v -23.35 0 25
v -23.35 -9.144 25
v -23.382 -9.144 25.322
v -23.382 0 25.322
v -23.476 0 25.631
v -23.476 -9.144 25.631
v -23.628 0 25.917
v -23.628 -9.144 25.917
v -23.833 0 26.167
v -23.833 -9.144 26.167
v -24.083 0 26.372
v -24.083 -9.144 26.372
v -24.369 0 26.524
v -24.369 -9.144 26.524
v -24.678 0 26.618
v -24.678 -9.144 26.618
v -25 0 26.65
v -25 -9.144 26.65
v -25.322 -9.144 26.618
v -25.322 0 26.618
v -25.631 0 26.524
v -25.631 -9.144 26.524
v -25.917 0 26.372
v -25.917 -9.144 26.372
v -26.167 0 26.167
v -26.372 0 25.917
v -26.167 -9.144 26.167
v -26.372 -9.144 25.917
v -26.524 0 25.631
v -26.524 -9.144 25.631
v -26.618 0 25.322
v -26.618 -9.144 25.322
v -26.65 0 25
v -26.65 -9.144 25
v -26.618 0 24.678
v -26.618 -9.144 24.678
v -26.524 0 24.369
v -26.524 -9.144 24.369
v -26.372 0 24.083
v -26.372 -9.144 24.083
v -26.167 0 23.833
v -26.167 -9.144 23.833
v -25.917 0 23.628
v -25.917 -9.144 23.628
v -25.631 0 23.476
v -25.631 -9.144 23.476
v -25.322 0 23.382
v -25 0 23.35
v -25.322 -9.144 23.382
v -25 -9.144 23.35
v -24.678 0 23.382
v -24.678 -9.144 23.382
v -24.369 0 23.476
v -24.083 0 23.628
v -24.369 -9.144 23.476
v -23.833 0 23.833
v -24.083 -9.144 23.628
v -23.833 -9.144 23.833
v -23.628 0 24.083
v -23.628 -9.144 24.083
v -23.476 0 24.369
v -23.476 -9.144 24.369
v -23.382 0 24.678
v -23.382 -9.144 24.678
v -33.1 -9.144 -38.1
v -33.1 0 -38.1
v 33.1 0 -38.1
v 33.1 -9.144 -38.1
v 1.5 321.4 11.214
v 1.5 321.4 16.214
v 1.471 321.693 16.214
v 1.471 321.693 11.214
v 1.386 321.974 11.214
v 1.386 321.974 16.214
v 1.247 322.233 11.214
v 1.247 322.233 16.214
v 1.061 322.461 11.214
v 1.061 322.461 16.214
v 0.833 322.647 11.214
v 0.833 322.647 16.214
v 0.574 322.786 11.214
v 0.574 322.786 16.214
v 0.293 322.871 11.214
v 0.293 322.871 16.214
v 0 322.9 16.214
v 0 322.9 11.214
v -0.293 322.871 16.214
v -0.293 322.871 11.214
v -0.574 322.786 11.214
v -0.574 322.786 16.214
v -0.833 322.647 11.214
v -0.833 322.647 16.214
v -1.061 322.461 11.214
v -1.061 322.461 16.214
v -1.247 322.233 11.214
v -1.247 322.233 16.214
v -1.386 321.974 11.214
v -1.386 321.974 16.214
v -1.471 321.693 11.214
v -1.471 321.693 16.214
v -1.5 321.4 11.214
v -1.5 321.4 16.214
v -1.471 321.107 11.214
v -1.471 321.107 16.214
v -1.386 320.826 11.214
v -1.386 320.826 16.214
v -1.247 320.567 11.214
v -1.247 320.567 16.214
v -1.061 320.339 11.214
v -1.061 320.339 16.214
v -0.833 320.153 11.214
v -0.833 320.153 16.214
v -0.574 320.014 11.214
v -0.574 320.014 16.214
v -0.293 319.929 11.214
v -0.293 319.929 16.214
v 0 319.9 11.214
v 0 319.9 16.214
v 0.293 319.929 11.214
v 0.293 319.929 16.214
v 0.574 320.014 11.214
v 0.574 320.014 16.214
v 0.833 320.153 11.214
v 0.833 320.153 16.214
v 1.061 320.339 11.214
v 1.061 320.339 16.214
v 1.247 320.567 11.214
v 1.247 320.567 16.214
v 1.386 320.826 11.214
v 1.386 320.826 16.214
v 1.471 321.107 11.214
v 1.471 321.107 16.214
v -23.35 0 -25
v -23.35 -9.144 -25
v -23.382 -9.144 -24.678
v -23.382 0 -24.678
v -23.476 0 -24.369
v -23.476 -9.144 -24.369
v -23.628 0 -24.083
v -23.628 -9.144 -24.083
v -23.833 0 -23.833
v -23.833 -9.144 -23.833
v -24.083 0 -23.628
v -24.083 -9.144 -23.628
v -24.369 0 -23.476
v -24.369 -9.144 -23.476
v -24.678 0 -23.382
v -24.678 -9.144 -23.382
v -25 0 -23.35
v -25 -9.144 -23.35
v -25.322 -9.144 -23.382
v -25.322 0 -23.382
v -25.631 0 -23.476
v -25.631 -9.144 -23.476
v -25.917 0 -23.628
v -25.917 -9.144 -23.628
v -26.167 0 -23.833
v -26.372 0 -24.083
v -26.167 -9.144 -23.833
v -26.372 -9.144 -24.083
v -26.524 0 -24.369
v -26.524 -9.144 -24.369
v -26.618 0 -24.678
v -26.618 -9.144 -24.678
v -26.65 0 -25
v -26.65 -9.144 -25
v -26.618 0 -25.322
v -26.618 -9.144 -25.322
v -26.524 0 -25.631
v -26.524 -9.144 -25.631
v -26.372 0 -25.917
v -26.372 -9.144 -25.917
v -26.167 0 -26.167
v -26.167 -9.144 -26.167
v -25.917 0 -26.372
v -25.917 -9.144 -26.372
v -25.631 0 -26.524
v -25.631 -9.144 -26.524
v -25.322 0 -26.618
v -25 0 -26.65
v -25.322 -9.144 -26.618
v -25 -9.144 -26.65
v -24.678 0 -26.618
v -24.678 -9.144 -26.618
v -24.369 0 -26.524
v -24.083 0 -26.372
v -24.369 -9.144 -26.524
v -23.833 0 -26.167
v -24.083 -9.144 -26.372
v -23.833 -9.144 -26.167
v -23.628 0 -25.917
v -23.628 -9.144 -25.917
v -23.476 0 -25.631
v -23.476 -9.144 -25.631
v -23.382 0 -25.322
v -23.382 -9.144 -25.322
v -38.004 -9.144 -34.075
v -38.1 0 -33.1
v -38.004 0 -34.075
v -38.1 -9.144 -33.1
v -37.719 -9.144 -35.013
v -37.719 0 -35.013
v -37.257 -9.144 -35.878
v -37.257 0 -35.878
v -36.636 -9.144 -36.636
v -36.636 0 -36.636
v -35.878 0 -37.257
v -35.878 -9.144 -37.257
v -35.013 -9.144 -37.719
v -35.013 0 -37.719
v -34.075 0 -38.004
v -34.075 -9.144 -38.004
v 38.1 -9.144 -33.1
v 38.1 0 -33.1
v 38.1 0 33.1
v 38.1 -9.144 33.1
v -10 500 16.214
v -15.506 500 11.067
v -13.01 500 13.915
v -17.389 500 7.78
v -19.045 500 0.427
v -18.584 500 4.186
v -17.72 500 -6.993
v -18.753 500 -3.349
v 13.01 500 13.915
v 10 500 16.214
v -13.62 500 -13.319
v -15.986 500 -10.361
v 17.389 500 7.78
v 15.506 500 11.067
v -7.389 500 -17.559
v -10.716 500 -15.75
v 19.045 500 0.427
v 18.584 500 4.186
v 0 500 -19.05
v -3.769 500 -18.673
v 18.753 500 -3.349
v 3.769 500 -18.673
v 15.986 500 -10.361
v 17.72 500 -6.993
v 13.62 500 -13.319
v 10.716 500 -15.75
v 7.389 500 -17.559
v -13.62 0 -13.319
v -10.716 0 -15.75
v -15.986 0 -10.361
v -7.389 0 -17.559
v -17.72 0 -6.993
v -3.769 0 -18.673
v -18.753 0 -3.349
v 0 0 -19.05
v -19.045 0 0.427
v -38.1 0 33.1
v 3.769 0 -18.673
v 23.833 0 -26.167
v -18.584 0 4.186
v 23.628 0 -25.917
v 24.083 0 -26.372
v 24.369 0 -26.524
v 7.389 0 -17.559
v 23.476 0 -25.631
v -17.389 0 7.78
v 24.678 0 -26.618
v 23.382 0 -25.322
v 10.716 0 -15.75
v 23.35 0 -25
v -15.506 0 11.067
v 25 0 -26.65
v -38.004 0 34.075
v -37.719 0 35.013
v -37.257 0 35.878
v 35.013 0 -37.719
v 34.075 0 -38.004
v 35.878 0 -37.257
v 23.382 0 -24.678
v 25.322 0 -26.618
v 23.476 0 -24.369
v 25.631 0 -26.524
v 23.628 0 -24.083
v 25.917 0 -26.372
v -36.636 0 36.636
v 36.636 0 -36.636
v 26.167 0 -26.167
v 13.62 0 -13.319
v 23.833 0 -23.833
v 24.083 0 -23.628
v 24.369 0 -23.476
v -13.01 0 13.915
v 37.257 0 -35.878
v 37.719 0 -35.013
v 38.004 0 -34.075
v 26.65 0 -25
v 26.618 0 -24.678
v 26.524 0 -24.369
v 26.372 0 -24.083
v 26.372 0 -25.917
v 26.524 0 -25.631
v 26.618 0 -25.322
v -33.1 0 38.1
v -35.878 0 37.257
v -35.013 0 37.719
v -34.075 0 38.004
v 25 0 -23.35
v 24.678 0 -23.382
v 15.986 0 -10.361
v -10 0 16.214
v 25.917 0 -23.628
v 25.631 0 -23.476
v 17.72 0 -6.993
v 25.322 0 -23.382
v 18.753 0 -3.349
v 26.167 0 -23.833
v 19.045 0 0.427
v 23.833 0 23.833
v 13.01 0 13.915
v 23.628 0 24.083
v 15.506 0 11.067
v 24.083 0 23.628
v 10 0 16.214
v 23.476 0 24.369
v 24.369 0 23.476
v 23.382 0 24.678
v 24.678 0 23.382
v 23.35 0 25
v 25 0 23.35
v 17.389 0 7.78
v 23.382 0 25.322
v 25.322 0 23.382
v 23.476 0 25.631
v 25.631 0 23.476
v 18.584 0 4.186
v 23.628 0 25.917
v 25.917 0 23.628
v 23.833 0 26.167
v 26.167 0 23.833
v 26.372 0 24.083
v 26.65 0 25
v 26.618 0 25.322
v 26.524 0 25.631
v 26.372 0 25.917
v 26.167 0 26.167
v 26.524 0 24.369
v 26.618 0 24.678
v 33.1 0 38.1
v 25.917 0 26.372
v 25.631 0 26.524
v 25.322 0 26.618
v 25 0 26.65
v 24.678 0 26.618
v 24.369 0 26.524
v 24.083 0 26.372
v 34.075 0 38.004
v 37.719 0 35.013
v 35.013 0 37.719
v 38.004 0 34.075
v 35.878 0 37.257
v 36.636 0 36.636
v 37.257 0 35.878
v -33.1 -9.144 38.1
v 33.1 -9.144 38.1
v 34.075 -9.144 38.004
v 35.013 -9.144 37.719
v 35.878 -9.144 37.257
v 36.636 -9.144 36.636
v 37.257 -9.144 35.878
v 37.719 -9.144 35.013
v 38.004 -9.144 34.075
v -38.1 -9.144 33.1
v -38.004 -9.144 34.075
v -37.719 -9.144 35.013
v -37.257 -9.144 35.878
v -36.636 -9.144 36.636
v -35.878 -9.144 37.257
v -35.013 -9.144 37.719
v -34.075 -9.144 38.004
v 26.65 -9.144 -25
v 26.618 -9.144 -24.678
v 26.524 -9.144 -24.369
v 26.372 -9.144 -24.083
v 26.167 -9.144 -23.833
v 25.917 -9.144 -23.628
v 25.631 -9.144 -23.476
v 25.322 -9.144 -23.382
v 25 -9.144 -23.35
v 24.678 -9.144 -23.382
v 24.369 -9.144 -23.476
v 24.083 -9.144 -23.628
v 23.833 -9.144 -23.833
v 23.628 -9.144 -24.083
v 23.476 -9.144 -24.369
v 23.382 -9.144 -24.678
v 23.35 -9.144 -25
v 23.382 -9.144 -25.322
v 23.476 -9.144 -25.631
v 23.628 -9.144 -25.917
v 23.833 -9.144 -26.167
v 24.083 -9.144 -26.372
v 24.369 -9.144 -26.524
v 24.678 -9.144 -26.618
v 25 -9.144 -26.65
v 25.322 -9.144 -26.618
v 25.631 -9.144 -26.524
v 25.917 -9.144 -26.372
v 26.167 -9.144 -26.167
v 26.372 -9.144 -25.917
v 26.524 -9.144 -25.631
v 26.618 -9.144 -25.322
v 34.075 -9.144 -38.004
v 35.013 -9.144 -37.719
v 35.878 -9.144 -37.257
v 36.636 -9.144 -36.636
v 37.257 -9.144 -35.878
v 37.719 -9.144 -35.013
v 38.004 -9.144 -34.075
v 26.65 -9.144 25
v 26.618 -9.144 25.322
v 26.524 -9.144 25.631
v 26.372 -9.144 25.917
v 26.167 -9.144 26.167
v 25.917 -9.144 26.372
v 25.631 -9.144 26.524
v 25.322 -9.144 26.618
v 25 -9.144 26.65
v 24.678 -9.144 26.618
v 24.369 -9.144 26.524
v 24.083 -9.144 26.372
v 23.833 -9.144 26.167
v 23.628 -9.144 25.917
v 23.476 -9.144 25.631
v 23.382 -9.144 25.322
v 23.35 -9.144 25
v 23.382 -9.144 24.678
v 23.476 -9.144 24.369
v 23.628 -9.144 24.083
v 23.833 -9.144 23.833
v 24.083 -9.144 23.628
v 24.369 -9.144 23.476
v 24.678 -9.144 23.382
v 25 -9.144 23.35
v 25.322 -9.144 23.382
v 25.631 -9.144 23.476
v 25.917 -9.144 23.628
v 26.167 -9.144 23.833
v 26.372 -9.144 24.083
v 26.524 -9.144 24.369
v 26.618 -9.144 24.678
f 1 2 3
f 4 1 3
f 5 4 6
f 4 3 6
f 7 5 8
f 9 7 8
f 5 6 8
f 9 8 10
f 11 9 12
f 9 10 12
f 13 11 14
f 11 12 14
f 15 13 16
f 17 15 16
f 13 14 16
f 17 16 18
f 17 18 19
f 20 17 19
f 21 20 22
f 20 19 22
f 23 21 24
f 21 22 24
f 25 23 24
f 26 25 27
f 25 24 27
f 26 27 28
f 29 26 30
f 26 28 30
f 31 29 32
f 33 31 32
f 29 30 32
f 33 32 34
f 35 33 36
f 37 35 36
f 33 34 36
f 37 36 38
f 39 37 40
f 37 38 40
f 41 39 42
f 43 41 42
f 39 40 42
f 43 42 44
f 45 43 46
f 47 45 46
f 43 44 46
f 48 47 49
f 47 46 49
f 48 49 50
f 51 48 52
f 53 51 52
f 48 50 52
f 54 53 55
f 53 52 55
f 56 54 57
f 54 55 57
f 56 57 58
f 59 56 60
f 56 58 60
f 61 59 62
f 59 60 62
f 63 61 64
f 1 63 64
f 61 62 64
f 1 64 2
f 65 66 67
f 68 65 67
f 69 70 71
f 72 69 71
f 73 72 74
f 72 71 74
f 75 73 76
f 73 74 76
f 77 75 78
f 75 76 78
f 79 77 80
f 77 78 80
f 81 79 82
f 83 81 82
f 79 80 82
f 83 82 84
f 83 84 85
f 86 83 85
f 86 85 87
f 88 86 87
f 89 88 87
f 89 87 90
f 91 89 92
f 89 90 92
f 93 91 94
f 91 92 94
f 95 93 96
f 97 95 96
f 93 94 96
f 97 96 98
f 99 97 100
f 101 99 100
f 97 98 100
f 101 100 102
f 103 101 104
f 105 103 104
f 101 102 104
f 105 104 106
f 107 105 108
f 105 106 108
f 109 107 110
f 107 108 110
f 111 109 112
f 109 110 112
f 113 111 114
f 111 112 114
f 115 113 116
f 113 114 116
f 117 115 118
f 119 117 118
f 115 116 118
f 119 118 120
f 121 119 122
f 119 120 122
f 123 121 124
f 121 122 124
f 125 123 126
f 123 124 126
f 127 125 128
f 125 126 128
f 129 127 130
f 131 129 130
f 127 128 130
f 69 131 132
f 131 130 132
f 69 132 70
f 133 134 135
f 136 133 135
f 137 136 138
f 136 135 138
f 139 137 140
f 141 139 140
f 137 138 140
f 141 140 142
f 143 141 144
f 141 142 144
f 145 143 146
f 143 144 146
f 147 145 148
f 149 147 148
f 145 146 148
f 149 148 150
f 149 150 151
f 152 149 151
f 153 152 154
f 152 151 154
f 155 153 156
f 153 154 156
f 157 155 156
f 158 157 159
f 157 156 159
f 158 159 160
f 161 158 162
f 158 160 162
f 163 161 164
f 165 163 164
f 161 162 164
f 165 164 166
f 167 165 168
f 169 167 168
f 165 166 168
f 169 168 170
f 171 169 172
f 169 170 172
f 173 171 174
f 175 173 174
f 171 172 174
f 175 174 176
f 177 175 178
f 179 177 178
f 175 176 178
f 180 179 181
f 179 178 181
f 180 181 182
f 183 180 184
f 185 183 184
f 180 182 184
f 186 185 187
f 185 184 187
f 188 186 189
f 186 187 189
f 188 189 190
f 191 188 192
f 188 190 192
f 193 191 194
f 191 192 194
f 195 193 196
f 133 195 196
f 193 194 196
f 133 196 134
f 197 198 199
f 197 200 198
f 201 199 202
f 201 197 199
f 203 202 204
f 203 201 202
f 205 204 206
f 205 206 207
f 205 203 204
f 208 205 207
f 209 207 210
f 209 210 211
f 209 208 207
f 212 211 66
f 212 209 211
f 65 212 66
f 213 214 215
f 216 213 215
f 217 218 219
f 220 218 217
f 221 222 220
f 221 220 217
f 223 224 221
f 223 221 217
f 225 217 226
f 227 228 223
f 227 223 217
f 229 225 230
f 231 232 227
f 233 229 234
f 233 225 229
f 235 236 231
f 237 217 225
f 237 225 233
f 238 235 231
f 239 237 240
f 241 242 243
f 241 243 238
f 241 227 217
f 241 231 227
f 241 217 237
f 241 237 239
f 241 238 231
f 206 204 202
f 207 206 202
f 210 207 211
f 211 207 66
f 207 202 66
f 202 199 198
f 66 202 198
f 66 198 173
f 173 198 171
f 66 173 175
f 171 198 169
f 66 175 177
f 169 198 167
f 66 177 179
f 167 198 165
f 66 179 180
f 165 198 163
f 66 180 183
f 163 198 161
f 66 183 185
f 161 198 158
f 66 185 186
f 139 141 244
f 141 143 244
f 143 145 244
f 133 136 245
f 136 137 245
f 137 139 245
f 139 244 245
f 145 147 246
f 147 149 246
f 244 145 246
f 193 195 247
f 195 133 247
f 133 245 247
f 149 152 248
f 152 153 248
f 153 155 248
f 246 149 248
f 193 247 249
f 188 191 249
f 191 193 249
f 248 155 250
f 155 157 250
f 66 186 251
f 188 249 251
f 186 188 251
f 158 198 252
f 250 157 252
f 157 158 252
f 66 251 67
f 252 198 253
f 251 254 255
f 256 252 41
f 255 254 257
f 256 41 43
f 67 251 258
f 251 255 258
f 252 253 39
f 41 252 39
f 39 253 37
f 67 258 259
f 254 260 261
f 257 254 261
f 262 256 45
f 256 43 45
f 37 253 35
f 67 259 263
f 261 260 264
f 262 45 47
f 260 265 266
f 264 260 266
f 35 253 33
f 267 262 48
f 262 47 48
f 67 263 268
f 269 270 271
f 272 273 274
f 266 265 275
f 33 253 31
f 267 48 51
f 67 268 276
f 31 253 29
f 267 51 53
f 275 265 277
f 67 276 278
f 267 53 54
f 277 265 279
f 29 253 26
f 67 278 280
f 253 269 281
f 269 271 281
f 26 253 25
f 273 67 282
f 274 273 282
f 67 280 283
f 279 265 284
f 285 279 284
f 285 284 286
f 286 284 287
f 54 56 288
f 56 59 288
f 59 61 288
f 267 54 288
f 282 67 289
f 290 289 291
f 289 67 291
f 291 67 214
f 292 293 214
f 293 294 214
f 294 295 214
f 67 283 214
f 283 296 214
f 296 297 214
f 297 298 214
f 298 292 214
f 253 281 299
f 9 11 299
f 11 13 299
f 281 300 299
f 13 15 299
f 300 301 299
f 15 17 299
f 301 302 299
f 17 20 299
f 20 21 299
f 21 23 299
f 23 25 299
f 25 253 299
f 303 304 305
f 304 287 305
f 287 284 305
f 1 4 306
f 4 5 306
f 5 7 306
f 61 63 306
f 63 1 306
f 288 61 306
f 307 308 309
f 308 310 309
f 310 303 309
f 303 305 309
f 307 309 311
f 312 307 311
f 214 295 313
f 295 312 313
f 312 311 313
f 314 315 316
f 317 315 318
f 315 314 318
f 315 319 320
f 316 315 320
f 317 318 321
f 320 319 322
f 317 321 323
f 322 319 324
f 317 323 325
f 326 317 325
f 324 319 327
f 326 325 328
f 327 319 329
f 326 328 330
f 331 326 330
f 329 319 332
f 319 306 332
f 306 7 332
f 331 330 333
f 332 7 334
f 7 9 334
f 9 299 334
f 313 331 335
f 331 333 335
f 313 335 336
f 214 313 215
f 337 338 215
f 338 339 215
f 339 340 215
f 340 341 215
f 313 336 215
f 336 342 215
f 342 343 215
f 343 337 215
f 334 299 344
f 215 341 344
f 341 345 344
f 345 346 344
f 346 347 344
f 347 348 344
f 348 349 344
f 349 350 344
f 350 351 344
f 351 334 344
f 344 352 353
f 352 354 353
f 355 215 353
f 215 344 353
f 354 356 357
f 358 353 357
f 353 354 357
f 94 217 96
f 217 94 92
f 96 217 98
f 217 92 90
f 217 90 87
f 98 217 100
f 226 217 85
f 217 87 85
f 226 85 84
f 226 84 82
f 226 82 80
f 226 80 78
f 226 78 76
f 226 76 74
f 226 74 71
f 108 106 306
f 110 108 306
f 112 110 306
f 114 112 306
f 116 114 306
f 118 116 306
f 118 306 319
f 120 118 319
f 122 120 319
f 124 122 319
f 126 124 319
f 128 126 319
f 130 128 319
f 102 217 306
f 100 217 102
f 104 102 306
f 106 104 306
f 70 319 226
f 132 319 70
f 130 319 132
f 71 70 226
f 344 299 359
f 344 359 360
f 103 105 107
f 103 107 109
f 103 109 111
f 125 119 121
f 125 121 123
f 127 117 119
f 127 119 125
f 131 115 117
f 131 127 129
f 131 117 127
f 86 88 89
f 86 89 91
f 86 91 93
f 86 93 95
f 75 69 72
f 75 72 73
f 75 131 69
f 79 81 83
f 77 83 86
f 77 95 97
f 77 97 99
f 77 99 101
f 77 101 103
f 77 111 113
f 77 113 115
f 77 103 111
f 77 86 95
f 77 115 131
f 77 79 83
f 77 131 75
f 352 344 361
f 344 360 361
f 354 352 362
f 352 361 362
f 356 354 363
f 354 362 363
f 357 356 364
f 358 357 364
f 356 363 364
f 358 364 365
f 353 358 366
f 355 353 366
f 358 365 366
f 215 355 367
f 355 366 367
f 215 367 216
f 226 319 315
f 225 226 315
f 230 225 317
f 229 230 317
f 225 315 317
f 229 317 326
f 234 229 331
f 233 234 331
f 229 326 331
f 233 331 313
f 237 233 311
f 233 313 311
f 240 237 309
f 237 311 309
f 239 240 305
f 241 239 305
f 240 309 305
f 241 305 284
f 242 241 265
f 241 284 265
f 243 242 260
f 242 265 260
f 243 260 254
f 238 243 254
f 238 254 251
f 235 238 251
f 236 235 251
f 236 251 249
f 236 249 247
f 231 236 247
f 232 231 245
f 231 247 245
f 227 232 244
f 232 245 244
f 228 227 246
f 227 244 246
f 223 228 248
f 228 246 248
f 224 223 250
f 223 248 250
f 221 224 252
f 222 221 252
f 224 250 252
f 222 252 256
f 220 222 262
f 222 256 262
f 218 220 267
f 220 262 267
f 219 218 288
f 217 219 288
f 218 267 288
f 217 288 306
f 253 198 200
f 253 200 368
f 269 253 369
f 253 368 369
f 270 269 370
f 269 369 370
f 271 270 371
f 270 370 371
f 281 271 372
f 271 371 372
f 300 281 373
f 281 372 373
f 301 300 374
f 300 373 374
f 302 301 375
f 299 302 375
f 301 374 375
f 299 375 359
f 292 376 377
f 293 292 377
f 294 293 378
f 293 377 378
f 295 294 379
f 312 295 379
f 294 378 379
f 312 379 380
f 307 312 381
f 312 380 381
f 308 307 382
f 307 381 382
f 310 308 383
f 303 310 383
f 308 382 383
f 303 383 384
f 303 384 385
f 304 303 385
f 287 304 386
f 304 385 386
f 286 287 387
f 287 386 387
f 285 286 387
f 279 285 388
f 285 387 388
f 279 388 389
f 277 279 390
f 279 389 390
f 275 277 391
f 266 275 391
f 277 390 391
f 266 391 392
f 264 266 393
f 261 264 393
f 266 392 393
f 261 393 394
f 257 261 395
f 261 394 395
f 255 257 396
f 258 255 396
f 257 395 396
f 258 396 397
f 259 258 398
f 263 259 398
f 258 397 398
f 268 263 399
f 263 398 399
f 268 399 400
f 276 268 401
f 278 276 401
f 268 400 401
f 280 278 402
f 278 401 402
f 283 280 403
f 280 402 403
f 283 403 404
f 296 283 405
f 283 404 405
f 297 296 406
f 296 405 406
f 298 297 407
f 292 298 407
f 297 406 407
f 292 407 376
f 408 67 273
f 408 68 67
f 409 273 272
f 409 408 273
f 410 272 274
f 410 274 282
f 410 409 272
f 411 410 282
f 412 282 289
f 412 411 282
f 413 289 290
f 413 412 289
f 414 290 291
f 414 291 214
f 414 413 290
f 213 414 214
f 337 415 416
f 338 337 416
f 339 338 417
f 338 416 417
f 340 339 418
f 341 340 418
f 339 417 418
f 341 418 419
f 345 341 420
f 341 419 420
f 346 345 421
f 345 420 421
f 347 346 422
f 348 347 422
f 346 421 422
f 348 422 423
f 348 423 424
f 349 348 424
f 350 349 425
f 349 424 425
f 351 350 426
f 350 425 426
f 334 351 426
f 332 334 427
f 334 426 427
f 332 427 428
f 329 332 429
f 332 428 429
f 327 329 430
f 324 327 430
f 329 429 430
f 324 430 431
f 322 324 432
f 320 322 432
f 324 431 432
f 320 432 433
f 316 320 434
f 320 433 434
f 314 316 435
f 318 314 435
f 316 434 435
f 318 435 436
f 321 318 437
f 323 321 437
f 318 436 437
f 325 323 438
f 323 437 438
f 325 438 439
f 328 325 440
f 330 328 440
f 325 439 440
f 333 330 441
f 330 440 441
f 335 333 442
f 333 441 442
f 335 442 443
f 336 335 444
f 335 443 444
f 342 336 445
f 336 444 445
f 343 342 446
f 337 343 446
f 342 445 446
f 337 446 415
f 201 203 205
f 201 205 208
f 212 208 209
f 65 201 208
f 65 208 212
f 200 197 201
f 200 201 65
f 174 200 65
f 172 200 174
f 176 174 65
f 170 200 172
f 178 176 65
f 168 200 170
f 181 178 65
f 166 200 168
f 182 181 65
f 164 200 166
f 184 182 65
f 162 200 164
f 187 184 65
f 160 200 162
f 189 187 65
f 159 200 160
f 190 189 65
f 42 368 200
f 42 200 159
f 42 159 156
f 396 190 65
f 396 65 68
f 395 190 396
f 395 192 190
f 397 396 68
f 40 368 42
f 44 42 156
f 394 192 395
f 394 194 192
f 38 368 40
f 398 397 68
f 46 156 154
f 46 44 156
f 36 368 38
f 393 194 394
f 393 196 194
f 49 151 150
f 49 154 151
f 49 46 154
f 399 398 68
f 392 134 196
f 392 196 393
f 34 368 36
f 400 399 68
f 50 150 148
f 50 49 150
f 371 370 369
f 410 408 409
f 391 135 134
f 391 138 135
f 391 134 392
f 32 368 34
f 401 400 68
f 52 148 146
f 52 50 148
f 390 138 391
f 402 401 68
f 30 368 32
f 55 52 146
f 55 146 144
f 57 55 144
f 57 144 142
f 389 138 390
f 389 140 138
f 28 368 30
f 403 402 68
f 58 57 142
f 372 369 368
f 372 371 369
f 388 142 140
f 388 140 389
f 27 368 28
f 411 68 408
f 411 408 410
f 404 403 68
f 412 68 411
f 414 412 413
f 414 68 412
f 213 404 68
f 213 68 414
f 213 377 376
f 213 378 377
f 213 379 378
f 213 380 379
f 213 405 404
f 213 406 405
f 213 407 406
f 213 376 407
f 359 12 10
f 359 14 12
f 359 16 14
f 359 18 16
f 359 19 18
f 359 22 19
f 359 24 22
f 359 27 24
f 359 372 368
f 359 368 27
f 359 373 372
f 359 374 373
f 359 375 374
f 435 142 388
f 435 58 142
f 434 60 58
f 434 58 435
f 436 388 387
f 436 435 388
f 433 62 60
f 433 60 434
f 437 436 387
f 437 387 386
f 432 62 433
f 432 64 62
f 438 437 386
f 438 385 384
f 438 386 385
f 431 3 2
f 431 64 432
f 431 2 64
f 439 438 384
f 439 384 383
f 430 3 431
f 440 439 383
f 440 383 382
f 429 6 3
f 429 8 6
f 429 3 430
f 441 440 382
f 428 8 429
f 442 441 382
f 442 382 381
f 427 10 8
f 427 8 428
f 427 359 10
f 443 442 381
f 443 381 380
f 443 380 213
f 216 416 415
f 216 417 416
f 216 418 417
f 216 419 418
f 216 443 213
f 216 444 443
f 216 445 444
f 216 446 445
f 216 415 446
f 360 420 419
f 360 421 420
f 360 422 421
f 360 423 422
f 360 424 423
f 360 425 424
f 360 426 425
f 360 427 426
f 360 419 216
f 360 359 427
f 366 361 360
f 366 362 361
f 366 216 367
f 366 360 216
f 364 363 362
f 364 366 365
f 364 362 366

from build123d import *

# Parameters (mm, degrees)
BOSS_EXTRUDE1_DEPTH = 500
SKETCH5_R           = 1.5
CUT_EXTRUDE1_DEPTH  = 5
SKETCH6_W           = 76.2
SKETCH6_H           = 76.2
BOSS_EXTRUDE2_DEPTH = 9.144
SKETCH7_R           = 1.65
CUT_EXTRUDE2_DEPTH  = 9.144
FILLET1_R           = 5


with BuildPart() as part:
    # Sketch3 → Boss-Extrude1 (new body)
    with BuildSketch(Plane(origin=(0, 0, 0), x_dir=(1, 0, 0), z_dir=(0, 1, 0))):
        with BuildLine():
            Line((-10, -16.214268408), (10, -16.214268408))
            ThreePointArc((10, -16.214268408), (0, 19.05), (-10, -16.214268408))
        make_face()
    extrude(amount=BOSS_EXTRUDE1_DEPTH)

    # Sketch5 → Cut-Extrude1 (cut)
    with BuildSketch(Plane.XY.offset(16.214268408)):
        with Locations((0, 321.4)):
            Circle(SKETCH5_R)
    extrude(amount=-CUT_EXTRUDE1_DEPTH, mode=Mode.SUBTRACT)

    # Sketch6 → Boss-Extrude2 (add)
    with BuildSketch(Plane.XZ):
        Rectangle(SKETCH6_W, SKETCH6_H)
    extrude(amount=BOSS_EXTRUDE2_DEPTH)

    # Sketch7 → Cut-Extrude2 (cut)
    with BuildSketch(Plane.XZ.offset(9.144)):
        with Locations((-25, 25)):
            Circle(SKETCH7_R)
        with Locations((25, 25)):
            Circle(SKETCH7_R)
        with Locations((25, -25)):
            Circle(SKETCH7_R)
        with Locations((-25, -25)):
            Circle(SKETCH7_R)
    extrude(amount=-CUT_EXTRUDE2_DEPTH, mode=Mode.SUBTRACT)

    # Fillet1
    fillet1_edges = [part.edges().sort_by_distance(p)[0] for p in [
        (38.1, -4.572, -38.1),
        (38.1, -4.572, 38.1),
        (-38.1, -4.572, 38.1),
        (-38.1, -4.572, -38.1),
    ]]
    fillet(fillet1_edges, radius=FILLET1_R)


solid = part.part
